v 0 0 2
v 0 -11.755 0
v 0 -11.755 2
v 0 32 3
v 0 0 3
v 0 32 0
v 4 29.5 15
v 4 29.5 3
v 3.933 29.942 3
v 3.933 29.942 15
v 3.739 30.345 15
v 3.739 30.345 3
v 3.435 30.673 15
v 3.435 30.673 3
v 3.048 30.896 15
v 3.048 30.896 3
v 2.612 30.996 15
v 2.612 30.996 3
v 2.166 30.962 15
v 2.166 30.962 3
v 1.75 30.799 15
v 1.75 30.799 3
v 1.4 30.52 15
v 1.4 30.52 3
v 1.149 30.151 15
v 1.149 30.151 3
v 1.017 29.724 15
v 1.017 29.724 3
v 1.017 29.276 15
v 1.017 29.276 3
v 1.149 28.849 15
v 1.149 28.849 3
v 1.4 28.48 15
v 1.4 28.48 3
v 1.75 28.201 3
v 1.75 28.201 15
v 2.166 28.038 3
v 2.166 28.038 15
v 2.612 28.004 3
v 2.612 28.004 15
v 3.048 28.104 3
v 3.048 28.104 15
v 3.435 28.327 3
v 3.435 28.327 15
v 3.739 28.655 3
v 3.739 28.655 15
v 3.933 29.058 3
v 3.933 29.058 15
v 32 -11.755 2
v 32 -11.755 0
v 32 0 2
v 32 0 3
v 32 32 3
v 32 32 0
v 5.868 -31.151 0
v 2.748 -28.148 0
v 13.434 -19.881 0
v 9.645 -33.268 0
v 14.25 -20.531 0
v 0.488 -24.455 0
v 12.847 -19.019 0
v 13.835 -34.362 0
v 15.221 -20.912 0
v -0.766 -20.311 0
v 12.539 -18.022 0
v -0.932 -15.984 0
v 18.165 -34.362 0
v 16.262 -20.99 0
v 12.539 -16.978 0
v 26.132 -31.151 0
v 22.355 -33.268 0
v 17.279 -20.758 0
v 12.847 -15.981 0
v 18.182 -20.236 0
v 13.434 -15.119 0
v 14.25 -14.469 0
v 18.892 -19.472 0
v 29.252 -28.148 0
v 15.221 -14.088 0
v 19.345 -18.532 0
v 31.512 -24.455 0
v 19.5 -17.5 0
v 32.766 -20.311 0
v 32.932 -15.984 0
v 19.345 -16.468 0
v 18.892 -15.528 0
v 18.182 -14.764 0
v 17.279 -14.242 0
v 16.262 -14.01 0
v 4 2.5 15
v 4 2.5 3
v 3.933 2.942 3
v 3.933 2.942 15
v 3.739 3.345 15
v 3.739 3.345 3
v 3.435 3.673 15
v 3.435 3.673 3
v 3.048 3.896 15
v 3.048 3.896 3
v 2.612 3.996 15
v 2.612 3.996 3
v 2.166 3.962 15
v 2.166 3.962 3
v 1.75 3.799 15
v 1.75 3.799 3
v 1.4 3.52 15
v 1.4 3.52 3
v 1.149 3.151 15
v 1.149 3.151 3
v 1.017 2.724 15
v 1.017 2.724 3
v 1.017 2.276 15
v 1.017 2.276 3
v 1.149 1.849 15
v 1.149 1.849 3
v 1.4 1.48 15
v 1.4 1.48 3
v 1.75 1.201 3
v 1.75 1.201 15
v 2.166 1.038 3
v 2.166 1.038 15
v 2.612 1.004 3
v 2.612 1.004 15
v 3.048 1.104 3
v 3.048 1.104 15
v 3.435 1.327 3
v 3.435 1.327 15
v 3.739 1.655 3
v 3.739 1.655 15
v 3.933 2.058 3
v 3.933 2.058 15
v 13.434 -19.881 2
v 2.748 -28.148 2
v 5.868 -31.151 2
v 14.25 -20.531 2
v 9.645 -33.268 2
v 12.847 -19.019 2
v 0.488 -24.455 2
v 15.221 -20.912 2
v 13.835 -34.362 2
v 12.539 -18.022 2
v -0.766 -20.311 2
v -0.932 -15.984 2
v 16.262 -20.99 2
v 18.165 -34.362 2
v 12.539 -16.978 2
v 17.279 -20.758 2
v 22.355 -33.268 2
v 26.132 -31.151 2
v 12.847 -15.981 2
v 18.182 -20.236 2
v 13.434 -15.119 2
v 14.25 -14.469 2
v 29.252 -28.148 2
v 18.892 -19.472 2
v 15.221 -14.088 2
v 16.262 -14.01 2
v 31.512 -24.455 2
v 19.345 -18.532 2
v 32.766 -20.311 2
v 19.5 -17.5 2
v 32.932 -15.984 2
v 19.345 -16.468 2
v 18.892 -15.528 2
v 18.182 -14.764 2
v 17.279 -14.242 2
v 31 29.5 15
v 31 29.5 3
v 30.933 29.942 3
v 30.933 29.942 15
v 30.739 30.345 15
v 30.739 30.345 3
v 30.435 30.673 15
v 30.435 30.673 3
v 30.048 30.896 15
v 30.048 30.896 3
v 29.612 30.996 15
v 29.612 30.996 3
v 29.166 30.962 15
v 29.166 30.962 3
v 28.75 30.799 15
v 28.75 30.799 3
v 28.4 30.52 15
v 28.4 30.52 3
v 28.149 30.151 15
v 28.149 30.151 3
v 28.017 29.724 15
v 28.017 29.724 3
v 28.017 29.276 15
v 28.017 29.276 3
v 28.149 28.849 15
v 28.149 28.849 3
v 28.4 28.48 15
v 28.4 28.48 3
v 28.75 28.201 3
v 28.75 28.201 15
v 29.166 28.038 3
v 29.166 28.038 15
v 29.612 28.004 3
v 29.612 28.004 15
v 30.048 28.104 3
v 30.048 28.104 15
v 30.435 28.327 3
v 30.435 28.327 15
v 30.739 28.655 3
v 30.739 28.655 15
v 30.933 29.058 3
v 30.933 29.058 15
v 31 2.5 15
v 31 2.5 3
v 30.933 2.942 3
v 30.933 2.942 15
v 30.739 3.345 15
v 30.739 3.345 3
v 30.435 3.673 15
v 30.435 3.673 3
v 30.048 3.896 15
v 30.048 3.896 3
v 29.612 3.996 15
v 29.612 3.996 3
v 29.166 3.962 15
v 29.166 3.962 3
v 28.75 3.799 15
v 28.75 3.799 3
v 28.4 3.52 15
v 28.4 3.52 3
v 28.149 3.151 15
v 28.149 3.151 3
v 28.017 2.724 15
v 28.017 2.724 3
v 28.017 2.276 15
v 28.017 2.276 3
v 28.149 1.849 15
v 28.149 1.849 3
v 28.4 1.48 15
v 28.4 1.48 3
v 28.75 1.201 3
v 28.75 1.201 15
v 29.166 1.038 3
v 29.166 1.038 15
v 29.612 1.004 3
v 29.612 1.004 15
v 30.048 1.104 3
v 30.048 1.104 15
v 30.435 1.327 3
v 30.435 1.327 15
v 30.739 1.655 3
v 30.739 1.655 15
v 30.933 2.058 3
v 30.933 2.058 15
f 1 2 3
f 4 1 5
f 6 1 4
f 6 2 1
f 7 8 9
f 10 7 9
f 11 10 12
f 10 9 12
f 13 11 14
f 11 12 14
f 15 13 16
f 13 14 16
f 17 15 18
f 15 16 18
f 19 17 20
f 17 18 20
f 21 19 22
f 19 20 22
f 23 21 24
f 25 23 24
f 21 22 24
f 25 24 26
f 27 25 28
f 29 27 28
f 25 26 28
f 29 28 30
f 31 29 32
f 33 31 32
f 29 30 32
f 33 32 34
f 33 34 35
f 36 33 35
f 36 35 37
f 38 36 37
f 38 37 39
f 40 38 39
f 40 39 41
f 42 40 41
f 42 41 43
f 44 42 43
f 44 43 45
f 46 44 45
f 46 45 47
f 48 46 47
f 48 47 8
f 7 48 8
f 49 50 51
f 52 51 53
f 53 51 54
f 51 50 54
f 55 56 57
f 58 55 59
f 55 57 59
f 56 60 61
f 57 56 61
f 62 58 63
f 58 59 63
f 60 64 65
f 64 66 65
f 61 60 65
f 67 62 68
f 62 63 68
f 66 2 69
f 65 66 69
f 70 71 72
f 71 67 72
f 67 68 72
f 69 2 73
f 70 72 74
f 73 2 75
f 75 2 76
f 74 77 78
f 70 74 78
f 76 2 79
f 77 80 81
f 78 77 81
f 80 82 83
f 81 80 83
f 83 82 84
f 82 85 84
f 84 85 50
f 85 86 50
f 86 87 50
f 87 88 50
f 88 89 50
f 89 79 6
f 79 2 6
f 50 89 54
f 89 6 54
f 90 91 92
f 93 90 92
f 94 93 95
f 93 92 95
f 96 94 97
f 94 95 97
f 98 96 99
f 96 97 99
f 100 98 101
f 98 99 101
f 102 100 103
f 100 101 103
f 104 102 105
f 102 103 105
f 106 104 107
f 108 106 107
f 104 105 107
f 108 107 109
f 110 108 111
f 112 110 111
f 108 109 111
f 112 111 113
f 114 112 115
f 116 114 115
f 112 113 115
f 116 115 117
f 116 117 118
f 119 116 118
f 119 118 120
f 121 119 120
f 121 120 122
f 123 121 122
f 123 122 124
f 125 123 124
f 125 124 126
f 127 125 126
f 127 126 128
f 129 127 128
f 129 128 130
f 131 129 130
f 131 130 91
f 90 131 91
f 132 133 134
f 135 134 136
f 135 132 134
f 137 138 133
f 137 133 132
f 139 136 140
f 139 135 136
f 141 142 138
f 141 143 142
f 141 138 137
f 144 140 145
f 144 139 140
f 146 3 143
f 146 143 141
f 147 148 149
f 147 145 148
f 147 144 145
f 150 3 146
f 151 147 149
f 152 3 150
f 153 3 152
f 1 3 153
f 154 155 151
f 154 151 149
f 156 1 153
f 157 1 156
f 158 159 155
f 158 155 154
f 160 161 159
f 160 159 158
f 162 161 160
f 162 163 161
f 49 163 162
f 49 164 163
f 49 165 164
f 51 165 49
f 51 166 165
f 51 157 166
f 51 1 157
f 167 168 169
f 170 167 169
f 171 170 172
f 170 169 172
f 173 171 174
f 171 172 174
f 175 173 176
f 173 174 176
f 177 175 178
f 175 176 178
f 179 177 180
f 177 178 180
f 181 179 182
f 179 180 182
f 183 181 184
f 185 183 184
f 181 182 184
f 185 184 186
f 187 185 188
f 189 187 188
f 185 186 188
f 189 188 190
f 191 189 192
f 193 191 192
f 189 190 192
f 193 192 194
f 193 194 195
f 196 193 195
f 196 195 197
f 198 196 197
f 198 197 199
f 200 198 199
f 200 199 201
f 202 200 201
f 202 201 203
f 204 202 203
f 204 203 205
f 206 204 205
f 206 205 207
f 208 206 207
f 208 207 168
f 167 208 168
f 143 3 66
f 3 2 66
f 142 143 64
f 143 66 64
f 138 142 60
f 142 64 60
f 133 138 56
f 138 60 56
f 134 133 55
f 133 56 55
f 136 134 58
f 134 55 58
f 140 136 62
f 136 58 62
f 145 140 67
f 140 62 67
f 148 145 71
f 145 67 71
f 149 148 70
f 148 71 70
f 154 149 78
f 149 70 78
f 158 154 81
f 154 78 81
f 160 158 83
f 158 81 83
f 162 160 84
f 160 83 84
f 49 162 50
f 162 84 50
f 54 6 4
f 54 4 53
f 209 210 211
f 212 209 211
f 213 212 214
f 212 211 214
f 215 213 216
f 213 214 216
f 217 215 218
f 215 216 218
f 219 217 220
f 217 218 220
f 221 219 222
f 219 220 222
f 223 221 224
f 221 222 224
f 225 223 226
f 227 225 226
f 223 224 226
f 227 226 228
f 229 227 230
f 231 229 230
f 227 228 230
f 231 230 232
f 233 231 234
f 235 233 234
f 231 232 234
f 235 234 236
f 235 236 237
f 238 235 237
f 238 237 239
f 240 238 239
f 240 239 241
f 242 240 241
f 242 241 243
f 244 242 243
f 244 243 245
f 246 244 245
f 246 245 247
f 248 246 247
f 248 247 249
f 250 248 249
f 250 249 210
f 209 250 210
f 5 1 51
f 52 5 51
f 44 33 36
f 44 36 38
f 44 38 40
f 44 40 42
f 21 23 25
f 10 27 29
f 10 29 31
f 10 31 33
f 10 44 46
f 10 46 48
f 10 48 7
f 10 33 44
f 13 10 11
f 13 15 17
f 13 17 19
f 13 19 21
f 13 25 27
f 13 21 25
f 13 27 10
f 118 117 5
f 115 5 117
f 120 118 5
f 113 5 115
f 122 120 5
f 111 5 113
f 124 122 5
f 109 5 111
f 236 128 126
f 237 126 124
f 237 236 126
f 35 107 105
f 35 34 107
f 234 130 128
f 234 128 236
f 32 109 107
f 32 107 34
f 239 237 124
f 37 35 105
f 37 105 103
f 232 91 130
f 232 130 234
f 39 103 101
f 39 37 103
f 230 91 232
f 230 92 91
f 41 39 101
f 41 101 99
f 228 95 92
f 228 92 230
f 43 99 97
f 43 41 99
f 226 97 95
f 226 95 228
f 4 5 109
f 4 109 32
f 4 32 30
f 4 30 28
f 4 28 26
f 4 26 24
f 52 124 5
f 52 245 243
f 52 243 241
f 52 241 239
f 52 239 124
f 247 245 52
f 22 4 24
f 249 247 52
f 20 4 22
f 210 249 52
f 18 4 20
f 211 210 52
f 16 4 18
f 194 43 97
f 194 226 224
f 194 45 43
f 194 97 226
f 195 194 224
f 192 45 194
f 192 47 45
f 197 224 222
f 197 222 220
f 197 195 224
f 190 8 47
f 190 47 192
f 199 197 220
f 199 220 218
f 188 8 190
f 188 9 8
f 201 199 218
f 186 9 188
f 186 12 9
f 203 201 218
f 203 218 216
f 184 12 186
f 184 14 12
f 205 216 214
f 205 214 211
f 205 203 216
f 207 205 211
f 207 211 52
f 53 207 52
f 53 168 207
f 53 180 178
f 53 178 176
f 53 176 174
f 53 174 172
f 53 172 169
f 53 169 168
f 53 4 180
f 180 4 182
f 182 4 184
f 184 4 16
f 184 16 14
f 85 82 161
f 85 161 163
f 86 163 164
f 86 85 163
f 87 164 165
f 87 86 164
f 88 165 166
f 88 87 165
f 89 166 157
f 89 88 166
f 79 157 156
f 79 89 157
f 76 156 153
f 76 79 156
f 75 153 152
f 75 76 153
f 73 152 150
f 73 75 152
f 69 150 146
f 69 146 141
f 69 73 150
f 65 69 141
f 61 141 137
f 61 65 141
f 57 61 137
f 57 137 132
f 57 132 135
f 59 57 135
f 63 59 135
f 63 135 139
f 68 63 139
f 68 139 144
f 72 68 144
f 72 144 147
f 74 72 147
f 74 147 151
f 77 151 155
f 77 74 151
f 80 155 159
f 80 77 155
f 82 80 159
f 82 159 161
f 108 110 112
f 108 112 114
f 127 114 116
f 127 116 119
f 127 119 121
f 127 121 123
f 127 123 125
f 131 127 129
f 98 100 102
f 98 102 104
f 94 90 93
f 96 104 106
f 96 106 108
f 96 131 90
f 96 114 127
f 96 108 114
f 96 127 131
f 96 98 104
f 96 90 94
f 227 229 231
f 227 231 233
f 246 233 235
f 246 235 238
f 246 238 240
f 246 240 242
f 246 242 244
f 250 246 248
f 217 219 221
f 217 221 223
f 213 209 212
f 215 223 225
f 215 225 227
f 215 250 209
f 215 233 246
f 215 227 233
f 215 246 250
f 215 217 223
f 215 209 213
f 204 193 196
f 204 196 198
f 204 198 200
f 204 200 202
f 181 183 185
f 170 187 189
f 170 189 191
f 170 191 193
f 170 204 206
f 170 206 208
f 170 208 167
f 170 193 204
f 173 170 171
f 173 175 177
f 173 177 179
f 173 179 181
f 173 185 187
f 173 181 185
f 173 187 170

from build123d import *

# Parameters (mm, degrees)
BOX001_W          = 32
BOX001_H          = 15
BOX001_DEPTH      = 2
CYLINDER005_R     = 3.5
CYLINDER005_DEPTH = 2
CYLINDER004_R     = 17
CYLINDER004_DEPTH = 2
CYLINDER003_R     = 1.5
CYLINDER003_DEPTH = 15
CYLINDER002_R     = 1.5
CYLINDER002_DEPTH = 15
CYLINDER001_R     = 1.5
CYLINDER001_DEPTH = 15
CYLINDER_R        = 1.5
CYLINDER_DEPTH    = 15
BOX_W             = 32
BOX_H             = 32
BOX_DEPTH         = 3


with BuildPart() as cube001:
    # Box001 → Box001 (new body)
    with BuildSketch(Plane(origin=(0, -13, 0), x_dir=(1, 0, 0), z_dir=(0, 0, 1))):
        with Locations((16, 7.5)):
            Rectangle(BOX001_W, BOX001_H)
    extrude(amount=BOX001_DEPTH)


with BuildPart() as cylinder005:
    # Cylinder005 → Cylinder005 (new body)
    with BuildSketch(Plane(origin=(16, -17.5, 0), x_dir=(1, 0, 0), z_dir=(0, 0, 1))):
        Circle(CYLINDER005_R)
    extrude(amount=CYLINDER005_DEPTH)


with BuildPart() as cut:
    # Cylinder004 → Cylinder004 (new body)
    with BuildSketch(Plane(origin=(16, -17.5, 0), x_dir=(1, 0, 0), z_dir=(0, 0, 1))):
        Circle(CYLINDER004_R)
    extrude(amount=CYLINDER004_DEPTH)

    # Cut: cut Cylinder005
    add(cylinder005.part, mode=Mode.SUBTRACT)


with BuildPart() as cylinder003:
    # Cylinder003 → Cylinder003 (new body)
    with BuildSketch(Plane(origin=(29.5, 29.5, 0), x_dir=(1, 0, 0), z_dir=(0, 0, 1))):
        Circle(CYLINDER003_R)
    extrude(amount=CYLINDER003_DEPTH)


with BuildPart() as cylinder002:
    # Cylinder002 → Cylinder002 (new body)
    with BuildSketch(Plane(origin=(2.5, 29.5, 0), x_dir=(1, 0, 0), z_dir=(0, 0, 1))):
        Circle(CYLINDER002_R)
    extrude(amount=CYLINDER002_DEPTH)


with BuildPart() as cylinder001:
    # Cylinder001 → Cylinder001 (new body)
    with BuildSketch(Plane(origin=(29.5, 2.5, 0), x_dir=(1, 0, 0), z_dir=(0, 0, 1))):
        Circle(CYLINDER001_R)
    extrude(amount=CYLINDER001_DEPTH)


with BuildPart() as cylinder:
    # Cylinder → Cylinder (new body)
    with BuildSketch(Plane(origin=(2.5, 2.5, 0), x_dir=(1, 0, 0), z_dir=(0, 0, 1))):
        Circle(CYLINDER_R)
    extrude(amount=CYLINDER_DEPTH)


with BuildPart() as fusion005:
    # Box → Box (new body)
    with BuildSketch(Plane.XY):
        with Locations((16, 16)):
            Rectangle(BOX_W, BOX_H)
    extrude(amount=BOX_DEPTH)

    # Fusion: union Cylinder
    add(cylinder.part)

    # Fusion001: union Cylinder001
    add(cylinder001.part)

    # Fusion002: union Cylinder002
    add(cylinder002.part)

    # Fusion003: union Cylinder003
    add(cylinder003.part)

    # Fusion004: union Cut
    add(cut.part)

    # Fusion005: union Cube001
    add(cube001.part)


solid = fusion005.part
